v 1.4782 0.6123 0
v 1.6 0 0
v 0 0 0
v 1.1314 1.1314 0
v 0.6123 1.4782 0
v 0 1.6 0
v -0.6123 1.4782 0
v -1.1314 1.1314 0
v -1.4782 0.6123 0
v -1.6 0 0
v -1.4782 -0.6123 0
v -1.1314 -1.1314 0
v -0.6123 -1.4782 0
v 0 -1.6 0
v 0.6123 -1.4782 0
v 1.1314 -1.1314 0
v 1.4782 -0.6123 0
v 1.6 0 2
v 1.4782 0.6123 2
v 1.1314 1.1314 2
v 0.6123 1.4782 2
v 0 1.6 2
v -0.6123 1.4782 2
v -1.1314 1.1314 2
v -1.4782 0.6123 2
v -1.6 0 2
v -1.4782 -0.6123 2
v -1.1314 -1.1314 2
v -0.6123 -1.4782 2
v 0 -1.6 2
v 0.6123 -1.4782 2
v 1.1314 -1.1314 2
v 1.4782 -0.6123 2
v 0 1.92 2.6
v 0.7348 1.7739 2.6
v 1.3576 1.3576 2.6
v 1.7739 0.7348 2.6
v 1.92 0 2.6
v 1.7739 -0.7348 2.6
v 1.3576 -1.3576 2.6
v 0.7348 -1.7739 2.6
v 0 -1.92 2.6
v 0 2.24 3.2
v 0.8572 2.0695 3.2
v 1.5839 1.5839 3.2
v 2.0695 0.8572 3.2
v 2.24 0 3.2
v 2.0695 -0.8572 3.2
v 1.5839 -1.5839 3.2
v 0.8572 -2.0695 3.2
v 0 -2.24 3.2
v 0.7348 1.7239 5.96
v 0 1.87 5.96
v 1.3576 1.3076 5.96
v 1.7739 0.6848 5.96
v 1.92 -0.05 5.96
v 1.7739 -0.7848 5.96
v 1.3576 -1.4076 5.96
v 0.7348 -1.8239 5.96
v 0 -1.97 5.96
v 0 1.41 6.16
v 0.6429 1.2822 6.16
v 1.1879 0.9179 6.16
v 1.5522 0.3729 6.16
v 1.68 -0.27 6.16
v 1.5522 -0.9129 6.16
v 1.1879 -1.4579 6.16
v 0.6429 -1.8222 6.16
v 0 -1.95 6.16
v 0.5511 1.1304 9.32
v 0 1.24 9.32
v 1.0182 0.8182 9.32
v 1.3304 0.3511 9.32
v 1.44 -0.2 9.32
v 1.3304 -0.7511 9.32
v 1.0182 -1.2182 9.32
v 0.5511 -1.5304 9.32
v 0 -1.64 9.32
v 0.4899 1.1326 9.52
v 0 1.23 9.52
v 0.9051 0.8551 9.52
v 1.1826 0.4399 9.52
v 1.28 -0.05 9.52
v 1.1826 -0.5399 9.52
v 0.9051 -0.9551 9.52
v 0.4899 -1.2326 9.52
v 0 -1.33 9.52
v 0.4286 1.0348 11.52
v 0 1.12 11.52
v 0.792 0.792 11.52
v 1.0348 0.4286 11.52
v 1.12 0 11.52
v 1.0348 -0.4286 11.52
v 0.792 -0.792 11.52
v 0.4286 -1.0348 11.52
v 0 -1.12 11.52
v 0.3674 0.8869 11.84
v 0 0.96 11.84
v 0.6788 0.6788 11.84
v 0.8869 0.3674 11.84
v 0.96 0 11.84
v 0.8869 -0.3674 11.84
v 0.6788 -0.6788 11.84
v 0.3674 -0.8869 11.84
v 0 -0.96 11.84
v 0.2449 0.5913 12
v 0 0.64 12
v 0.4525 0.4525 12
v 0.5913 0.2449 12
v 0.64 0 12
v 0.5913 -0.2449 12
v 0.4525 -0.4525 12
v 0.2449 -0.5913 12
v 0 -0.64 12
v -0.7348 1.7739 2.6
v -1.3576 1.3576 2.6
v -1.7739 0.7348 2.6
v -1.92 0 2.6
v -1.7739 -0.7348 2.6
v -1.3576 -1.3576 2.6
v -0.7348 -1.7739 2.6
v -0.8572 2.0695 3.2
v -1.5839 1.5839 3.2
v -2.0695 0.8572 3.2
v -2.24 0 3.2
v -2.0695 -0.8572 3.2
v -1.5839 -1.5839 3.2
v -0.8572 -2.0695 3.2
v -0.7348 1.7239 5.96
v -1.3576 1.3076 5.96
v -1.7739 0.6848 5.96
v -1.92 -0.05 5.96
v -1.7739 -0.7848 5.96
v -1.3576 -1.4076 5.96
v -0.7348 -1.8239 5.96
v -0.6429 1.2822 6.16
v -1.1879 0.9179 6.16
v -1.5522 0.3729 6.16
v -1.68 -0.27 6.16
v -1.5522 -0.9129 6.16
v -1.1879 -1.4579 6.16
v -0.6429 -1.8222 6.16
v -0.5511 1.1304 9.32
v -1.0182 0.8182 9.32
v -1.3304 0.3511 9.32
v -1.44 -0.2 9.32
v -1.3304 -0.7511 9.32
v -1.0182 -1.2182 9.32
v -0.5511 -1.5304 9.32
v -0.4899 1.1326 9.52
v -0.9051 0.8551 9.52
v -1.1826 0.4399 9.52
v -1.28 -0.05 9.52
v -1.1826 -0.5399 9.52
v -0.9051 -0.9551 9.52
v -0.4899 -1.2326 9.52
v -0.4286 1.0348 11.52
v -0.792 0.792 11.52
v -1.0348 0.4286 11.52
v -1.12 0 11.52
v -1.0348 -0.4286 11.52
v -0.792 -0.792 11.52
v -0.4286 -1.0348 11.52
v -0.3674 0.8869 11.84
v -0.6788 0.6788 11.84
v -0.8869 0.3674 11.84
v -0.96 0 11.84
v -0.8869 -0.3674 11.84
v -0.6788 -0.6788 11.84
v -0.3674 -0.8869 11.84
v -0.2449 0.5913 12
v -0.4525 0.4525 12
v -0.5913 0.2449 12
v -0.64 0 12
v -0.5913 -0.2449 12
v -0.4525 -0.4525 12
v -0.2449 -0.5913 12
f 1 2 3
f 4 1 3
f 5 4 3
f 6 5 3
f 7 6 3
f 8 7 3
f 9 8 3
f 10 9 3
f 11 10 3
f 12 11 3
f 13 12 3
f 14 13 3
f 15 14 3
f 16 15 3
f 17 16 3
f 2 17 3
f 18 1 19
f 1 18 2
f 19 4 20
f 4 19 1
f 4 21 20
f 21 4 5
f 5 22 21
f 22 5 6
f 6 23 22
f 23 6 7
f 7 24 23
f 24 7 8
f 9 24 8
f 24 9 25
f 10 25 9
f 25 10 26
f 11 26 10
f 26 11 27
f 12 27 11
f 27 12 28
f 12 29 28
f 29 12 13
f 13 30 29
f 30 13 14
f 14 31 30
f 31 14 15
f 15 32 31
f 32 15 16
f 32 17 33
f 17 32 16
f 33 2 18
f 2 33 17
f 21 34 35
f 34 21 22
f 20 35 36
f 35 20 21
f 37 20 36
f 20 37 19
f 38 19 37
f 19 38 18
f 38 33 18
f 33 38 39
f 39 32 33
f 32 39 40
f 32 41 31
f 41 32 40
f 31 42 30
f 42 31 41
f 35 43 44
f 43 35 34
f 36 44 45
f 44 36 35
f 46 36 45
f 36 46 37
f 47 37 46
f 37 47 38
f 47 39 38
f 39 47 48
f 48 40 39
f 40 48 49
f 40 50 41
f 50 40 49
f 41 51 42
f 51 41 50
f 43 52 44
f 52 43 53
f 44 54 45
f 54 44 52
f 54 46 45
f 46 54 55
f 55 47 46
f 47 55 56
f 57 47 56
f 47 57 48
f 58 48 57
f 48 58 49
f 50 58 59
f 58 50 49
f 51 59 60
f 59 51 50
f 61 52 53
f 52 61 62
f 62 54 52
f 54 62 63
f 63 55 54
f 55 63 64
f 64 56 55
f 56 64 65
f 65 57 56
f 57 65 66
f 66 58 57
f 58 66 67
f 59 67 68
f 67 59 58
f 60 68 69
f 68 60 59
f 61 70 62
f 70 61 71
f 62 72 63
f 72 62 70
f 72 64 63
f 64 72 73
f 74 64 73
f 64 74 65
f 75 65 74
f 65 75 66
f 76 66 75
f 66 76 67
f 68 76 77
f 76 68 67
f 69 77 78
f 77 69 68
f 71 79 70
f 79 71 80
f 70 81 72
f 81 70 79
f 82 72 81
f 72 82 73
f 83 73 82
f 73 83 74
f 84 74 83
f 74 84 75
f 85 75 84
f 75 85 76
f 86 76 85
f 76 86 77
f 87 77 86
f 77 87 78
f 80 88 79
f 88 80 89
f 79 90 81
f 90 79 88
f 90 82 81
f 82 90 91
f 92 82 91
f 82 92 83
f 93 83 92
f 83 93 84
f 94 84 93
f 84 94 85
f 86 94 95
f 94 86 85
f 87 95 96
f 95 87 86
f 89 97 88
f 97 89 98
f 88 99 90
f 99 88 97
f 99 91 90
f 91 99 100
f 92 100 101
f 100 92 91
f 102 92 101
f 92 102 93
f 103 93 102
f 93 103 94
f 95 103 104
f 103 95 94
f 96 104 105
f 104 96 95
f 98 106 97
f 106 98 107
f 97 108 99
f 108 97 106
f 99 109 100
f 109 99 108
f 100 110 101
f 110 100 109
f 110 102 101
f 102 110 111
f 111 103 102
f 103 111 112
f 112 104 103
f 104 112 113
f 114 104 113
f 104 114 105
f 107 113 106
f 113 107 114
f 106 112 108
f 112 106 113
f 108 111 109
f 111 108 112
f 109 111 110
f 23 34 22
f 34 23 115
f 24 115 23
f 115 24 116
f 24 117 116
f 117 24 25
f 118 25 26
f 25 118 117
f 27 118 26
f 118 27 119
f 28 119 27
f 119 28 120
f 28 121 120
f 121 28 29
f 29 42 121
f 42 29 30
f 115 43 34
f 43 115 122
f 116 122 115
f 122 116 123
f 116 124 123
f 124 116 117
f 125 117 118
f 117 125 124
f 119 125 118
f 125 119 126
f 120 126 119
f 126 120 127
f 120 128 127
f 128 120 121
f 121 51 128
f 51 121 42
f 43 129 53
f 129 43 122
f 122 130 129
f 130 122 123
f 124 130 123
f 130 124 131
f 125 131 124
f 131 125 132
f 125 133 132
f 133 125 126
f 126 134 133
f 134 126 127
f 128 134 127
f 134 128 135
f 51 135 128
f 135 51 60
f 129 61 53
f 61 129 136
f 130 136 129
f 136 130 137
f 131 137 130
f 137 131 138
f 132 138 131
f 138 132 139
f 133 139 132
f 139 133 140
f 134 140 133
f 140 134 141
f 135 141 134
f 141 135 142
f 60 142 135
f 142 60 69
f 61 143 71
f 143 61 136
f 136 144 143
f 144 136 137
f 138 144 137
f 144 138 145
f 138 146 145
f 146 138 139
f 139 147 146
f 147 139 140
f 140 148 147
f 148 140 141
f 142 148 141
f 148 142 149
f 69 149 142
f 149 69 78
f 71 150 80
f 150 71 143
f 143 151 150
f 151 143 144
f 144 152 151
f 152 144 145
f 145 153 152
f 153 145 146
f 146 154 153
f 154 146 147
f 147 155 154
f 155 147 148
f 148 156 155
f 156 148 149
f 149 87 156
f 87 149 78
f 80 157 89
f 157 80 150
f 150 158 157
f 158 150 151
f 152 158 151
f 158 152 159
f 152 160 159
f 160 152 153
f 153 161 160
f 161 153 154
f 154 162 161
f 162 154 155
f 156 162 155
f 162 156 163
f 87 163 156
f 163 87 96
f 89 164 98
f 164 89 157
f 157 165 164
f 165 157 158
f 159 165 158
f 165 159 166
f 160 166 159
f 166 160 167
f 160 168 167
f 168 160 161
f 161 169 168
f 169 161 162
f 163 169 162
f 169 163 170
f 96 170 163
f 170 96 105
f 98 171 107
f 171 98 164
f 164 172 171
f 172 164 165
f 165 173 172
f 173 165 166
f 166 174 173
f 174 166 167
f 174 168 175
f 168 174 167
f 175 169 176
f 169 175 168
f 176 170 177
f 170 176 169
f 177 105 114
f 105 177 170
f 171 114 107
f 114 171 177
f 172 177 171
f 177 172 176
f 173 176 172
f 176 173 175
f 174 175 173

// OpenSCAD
// file: ../p/3-8edge.scad
use <../lib.scad>
function ldraw_lib__3_8edge() = [
// 0 Circle 0.375
// 0 Name: 3-8edge.dat
// 0 Author: James Jessiman
// 0 !LDRAW_ORG Primitive UPDATE 2017-01
// 0 !LICENSE Licensed under CC BY 4.0 : see CAreadme.txt
// 
// 0 BFC CERTIFY CCW
  [0,"BFC","CERTIFY"],
  [0,"BFC","CCW"],
// 
// 0 !HISTORY 2007-06-24 [PTadmin] Header formatted for Contributor Agreement
// 0 !HISTORY 2008-07-01 [PTadmin] Official Update 2008-01
// 0 !HISTORY 2017-01-15 [Steffen] BFCed
// 0 !HISTORY 2017-12-30 [PTadmin] Official Update 2017-01
// 
// 
// 2 24 1 0 0 0.9239 0 0.3827
  [2,24,1,0,0,0.9239,0,0.3827],
// 2 24 0.9239 0 0.3827 0.7071 0 0.7071
  [2,24,0.9239,0,0.3827,0.7071,0,0.7071],
// 2 24 0.7071 0 0.7071 0.3827 0 0.9239
  [2,24,0.7071,0,0.7071,0.3827,0,0.9239],
// 2 24 0.3827 0 0.9239 0 0 1
  [2,24,0.3827,0,0.9239,0,0,1],
// 2 24 0 0 1 -0.3827 0 0.9239
  [2,24,0,0,1,-0.3827,0,0.9239],
// 2 24 -0.3827 0 0.9239 -0.7071 0 0.7071
  [2,24,-0.3827,0,0.9239,-0.7071,0,0.7071],
];
module ldraw_lib__3_8edge(step=0, col=false, unit=2/5, alt=false, line=0.2, solid=!$preview)
    makepoly(ldraw_lib__3_8edge(), step=step, col=col, unit=unit, alt=alt, line=line, solid=solid);
ldraw_lib__3_8edge(line=0.2);
// file: ../p/2-4edge.scad
use <../lib.scad>
function ldraw_lib__2_4edge() = [
// 0 Circle 0.5
// 0 Name: 2-4edge.dat
// 0 Author: James Jessiman
// 0 !LDRAW_ORG Primitive UPDATE 2017-01
// 0 !LICENSE Licensed under CC BY 4.0 : see CAreadme.txt
// 
// 0 BFC CERTIFY CCW
  [0,"BFC","CERTIFY"],
  [0,"BFC","CCW"],
// 
// 0 !HISTORY 2007-06-24 [PTadmin] Header formatted for Contributor Agreement
// 0 !HISTORY 2008-07-01 [PTadmin] Official Update 2008-01
// 0 !HISTORY 2017-01-15 [Steffen] BFCed
// 0 !HISTORY 2017-12-30 [PTadmin] Official Update 2017-01
// 
// 
// 2 24 1 0 0 0.9239 0 0.3827
  [2,24,1,0,0,0.9239,0,0.3827],
// 2 24 0.9239 0 0.3827 0.7071 0 0.7071
  [2,24,0.9239,0,0.3827,0.7071,0,0.7071],
// 2 24 0.7071 0 0.7071 0.3827 0 0.9239
  [2,24,0.7071,0,0.7071,0.3827,0,0.9239],
// 2 24 0.3827 0 0.9239 0 0 1
  [2,24,0.3827,0,0.9239,0,0,1],
// 2 24 0 0 1 -0.3827 0 0.9239
  [2,24,0,0,1,-0.3827,0,0.9239],
// 2 24 -0.3827 0 0.9239 -0.7071 0 0.7071
  [2,24,-0.3827,0,0.9239,-0.7071,0,0.7071],
// 2 24 -0.7071 0 0.7071 -0.9239 0 0.3827
  [2,24,-0.7071,0,0.7071,-0.9239,0,0.3827],
// 2 24 -0.9239 0 0.3827 -1 0 0
  [2,24,-0.9239,0,0.3827,-1,0,0],
];
module ldraw_lib__2_4edge(step=0, col=false, unit=2/5, alt=false, line=0.2, solid=!$preview)
    makepoly(ldraw_lib__2_4edge(), step=step, col=col, unit=unit, alt=alt, line=line, solid=solid);
ldraw_lib__2_4edge(line=0.2);
// file: ../p/2-4con8.scad
use <../lib.scad>
function ldraw_lib__2_4con8() = [
// 0 Cone  8 x 0.5
// 0 Name: 2-4con8.dat
// 0 Author: Donald Sutter [technog]
// 0 !LDRAW_ORG Primitive UPDATE 2012-02
// 0 !LICENSE Licensed under CC BY 4.0 : see CAreadme.txt
// 
// 0 BFC CERTIFY CCW
  [0,"BFC","CERTIFY"],
  [0,"BFC","CCW"],
// 
// 0 !HISTORY 2012-08-09 [PTadmin] Official Update 2012-02
// 
// 
// 4 16 8 1 0 7.3912 1 3.0616 8.3151 0 3.4443 9 0 0
  [4,16,8,1,0,7.3912,1,3.0616,8.3151,0,3.4443,9,0,0],
// 4 16 7.3912 1 3.0616 5.6568 1 5.6568 6.3639 0 6.3639 8.3151 0 3.4443
  [4,16,7.3912,1,3.0616,5.6568,1,5.6568,6.3639,0,6.3639,8.3151,0,3.4443],
// 4 16 5.6568 1 5.6568 3.0616 1 7.3912 3.4443 0 8.3151 6.3639 0 6.3639
  [4,16,5.6568,1,5.6568,3.0616,1,7.3912,3.4443,0,8.3151,6.3639,0,6.3639],
// 4 16 3.0616 1 7.3912 0 1 8 0 0 9 3.4443 0 8.3151
  [4,16,3.0616,1,7.3912,0,1,8,0,0,9,3.4443,0,8.3151],
// 4 16 0 1 8 -3.0616 1 7.3912 -3.4443 0 8.3151 0 0 9
  [4,16,0,1,8,-3.0616,1,7.3912,-3.4443,0,8.3151,0,0,9],
// 4 16 -3.0616 1 7.3912 -5.6568 1 5.6568 -6.3639 0 6.3639 -3.4443 0 8.3151
  [4,16,-3.0616,1,7.3912,-5.6568,1,5.6568,-6.3639,0,6.3639,-3.4443,0,8.3151],
// 4 16 -5.6568 1 5.6568 -7.3912 1 3.0616 -8.3151 0 3.4443 -6.3639 0 6.3639
  [4,16,-5.6568,1,5.6568,-7.3912,1,3.0616,-8.3151,0,3.4443,-6.3639,0,6.3639],
// 4 16 -7.3912 1 3.0616 -8 1 0 -9 0 0 -8.3151 0 3.4443
  [4,16,-7.3912,1,3.0616,-8,1,0,-9,0,0,-8.3151,0,3.4443],
// 5 24 8 1 0 9 0 0 8 1 -3.3137 7.391 1 3.0615
  [5,24,8,1,0,9,0,0,8,1,-3.3137,7.391,1,3.0615],
// 5 24 7.3912 1 3.0616 8.3151 0 3.4443 8 1 0 5.6569 1 5.6569
  [5,24,7.3912,1,3.0616,8.3151,0,3.4443,8,1,0,5.6569,1,5.6569],
// 5 24 5.6568 1 5.6568 6.3639 0 6.3639 7.391 1 3.0615 3.0615 1 7.391
  [5,24,5.6568,1,5.6568,6.3639,0,6.3639,7.391,1,3.0615,3.0615,1,7.391],
// 5 24 3.0616 1 7.3912 3.4443 0 8.3151 5.6569 1 5.6569 0 1 8
  [5,24,3.0616,1,7.3912,3.4443,0,8.3151,5.6569,1,5.6569,0,1,8],
// 5 24 0 1 8 0 0 9 3.0615 1 7.391 -3.0615 1 7.391
  [5,24,0,1,8,0,0,9,3.0615,1,7.391,-3.0615,1,7.391],
// 5 24 -3.0616 1 7.3912 -3.4443 0 8.3151 0 1 8 -5.6569 1 5.6569
  [5,24,-3.0616,1,7.3912,-3.4443,0,8.3151,0,1,8,-5.6569,1,5.6569],
// 5 24 -5.6568 1 5.6568 -6.3639 0 6.3639 -3.0615 1 7.391 -7.391 1 3.0615
  [5,24,-5.6568,1,5.6568,-6.3639,0,6.3639,-3.0615,1,7.391,-7.391,1,3.0615],
// 5 24 -7.3912 1 3.0616 -8.3151 0 3.4443 -5.6569 1 5.6569 -8 1 0
  [5,24,-7.3912,1,3.0616,-8.3151,0,3.4443,-5.6569,1,5.6569,-8,1,0],
// 5 24 -8 1 0 -9 0 0 -7.391 1 3.0615 -8 1 -3.3137
  [5,24,-8,1,0,-9,0,0,-7.391,1,3.0615,-8,1,-3.3137],
];
module ldraw_lib__2_4con8(step=0, col=false, unit=2/5, alt=false, line=0.2, solid=!$preview)
    makepoly(ldraw_lib__2_4con8(), step=step, col=col, unit=unit, alt=alt, line=line, solid=solid);
ldraw_lib__2_4con8(line=0.2);
// file: ../p/2-4con7.scad
use <../lib.scad>
function ldraw_lib__2_4con7() = [
// 0 Cone  7 x 0.5
// 0 Name: 2-4con7.dat
// 0 Author: Willy Tschager [Holly-Wood]
// 0 !LDRAW_ORG Primitive UPDATE 2024-02
// 0 !LICENSE Licensed under CC BY 4.0 : see CAreadme.txt
// 
// 0 BFC CERTIFY CCW
  [0,"BFC","CERTIFY"],
  [0,"BFC","CCW"],
// 
// 0 !HISTORY 2014-06-21 [PTadmin] Official Update 2014-01
// 0 !HISTORY 2024-02-09 [Holly-Wood] Complete regeneration, original by guyvivan
// 0 !HISTORY 2024-03-24 [OrionP] Official Update 2024-02
// 
// 4 16 7 1 0 6.4673 1 2.6789 7.3912 0 3.0616 8 0 0
  [4,16,7,1,0,6.4673,1,2.6789,7.3912,0,3.0616,8,0,0],
// 4 16 6.4673 1 2.6789 4.9497 1 4.9497 5.6568 0 5.6568 7.3912 0 3.0616
  [4,16,6.4673,1,2.6789,4.9497,1,4.9497,5.6568,0,5.6568,7.3912,0,3.0616],
// 4 16 4.9497 1 4.9497 2.6789 1 6.4673 3.0616 0 7.3912 5.6568 0 5.6568
  [4,16,4.9497,1,4.9497,2.6789,1,6.4673,3.0616,0,7.3912,5.6568,0,5.6568],
// 4 16 2.6789 1 6.4673 0 1 7 0 0 8 3.0616 0 7.3912
  [4,16,2.6789,1,6.4673,0,1,7,0,0,8,3.0616,0,7.3912],
// 4 16 0 1 7 -2.6789 1 6.4673 -3.0616 0 7.3912 0 0 8
  [4,16,0,1,7,-2.6789,1,6.4673,-3.0616,0,7.3912,0,0,8],
// 4 16 -2.6789 1 6.4673 -4.9497 1 4.9497 -5.6568 0 5.6568 -3.0616 0 7.3912
  [4,16,-2.6789,1,6.4673,-4.9497,1,4.9497,-5.6568,0,5.6568,-3.0616,0,7.3912],
// 4 16 -4.9497 1 4.9497 -6.4673 1 2.6789 -7.3912 0 3.0616 -5.6568 0 5.6568
  [4,16,-4.9497,1,4.9497,-6.4673,1,2.6789,-7.3912,0,3.0616,-5.6568,0,5.6568],
// 4 16 -6.4673 1 2.6789 -7 1 0 -8 0 0 -7.3912 0 3.0616
  [4,16,-6.4673,1,2.6789,-7,1,0,-8,0,0,-7.3912,0,3.0616],
// 0 // conditional lines
// 5 24 7 1 0 8 0 0 7 1 -2.8994 6.4673 1 2.6789
  [5,24,7,1,0,8,0,0,7,1,-2.8994,6.4673,1,2.6789],
// 5 24 6.4673 1 2.6789 7.3912 0 3.0616 7 1 0 4.9497 1 4.9497
  [5,24,6.4673,1,2.6789,7.3912,0,3.0616,7,1,0,4.9497,1,4.9497],
// 5 24 4.9497 1 4.9497 5.6568 0 5.6568 6.4673 1 2.6789 2.6789 1 6.4673
  [5,24,4.9497,1,4.9497,5.6568,0,5.6568,6.4673,1,2.6789,2.6789,1,6.4673],
// 5 24 2.6789 1 6.4673 3.0616 0 7.3912 4.9497 1 4.9497 0 1 7
  [5,24,2.6789,1,6.4673,3.0616,0,7.3912,4.9497,1,4.9497,0,1,7],
// 5 24 0 1 7 0 0 8 2.6789 1 6.4673 -2.6789 1 6.4673
  [5,24,0,1,7,0,0,8,2.6789,1,6.4673,-2.6789,1,6.4673],
// 5 24 -2.6789 1 6.4673 -3.0616 0 7.3912 0 1 7 -4.9497 1 4.9497
  [5,24,-2.6789,1,6.4673,-3.0616,0,7.3912,0,1,7,-4.9497,1,4.9497],
// 5 24 -4.9497 1 4.9497 -5.6568 0 5.6568 -2.6789 1 6.4673 -6.4673 1 2.6789
  [5,24,-4.9497,1,4.9497,-5.6568,0,5.6568,-2.6789,1,6.4673,-6.4673,1,2.6789],
// 5 24 -6.4673 1 2.6789 -7.3912 0 3.0616 -4.9497 1 4.9497 -7 1 0
  [5,24,-6.4673,1,2.6789,-7.3912,0,3.0616,-4.9497,1,4.9497,-7,1,0],
// 5 24 -7 1 0 -8 0 0 -6.4673 1 2.6789 -7 1 -2.8994
  [5,24,-7,1,0,-8,0,0,-6.4673,1,2.6789,-7,1,-2.8994],
// 0 // Build by LDPartEditor (PrimGen 2.X)
];
module ldraw_lib__2_4con7(step=0, col=false, unit=2/5, alt=false, line=0.2, solid=!$preview)
    makepoly(ldraw_lib__2_4con7(), step=step, col=col, unit=unit, alt=alt, line=line, solid=solid);
ldraw_lib__2_4con7(line=0.2);
// file: ../p/2-4con6.scad
use <../lib.scad>
function ldraw_lib__2_4con6() = [
// 0 Cone  6 x 0.5
// 0 Name: 2-4con6.dat
// 0 Author: Max Martin Richter [MMR1988]
// 0 !LDRAW_ORG Primitive UPDATE 2020-01
// 0 !LICENSE Licensed under CC BY 4.0 : see CAreadme.txt
// 
// 0 BFC CERTIFY CCW
  [0,"BFC","CERTIFY"],
  [0,"BFC","CCW"],
// 
// 0 !HISTORY 2020-06-28 [PTadmin] Official Update 2020-01
// 
// 
// 4 16 6 1 0 5.5434 1 2.2962 6.4673 0 2.6789 7 0 0
  [4,16,6,1,0,5.5434,1,2.2962,6.4673,0,2.6789,7,0,0],
// 4 16 5.5434 1 2.2962 4.2426 1 4.2426 4.9497 0 4.9497 6.4673 0 2.6789
  [4,16,5.5434,1,2.2962,4.2426,1,4.2426,4.9497,0,4.9497,6.4673,0,2.6789],
// 4 16 4.2426 1 4.2426 2.2962 1 5.5434 2.6789 0 6.4673 4.9497 0 4.9497
  [4,16,4.2426,1,4.2426,2.2962,1,5.5434,2.6789,0,6.4673,4.9497,0,4.9497],
// 4 16 2.2962 1 5.5434 0 1 6 0 0 7 2.6789 0 6.4673
  [4,16,2.2962,1,5.5434,0,1,6,0,0,7,2.6789,0,6.4673],
// 4 16 0 1 6 -2.2962 1 5.5434 -2.6789 0 6.4673 0 0 7
  [4,16,0,1,6,-2.2962,1,5.5434,-2.6789,0,6.4673,0,0,7],
// 4 16 -2.2962 1 5.5434 -4.2426 1 4.2426 -4.9497 0 4.9497 -2.6789 0 6.4673
  [4,16,-2.2962,1,5.5434,-4.2426,1,4.2426,-4.9497,0,4.9497,-2.6789,0,6.4673],
// 4 16 -4.2426 1 4.2426 -5.5434 1 2.2962 -6.4673 0 2.6789 -4.9497 0 4.9497
  [4,16,-4.2426,1,4.2426,-5.5434,1,2.2962,-6.4673,0,2.6789,-4.9497,0,4.9497],
// 4 16 -5.5434 1 2.2962 -6 1 0 -7 0 0 -6.4673 0 2.6789
  [4,16,-5.5434,1,2.2962,-6,1,0,-7,0,0,-6.4673,0,2.6789],
// 0 // conditional lines
// 5 24 6 1 0 7 0 0 6 1 -2.4852 5.5434 1 2.2962
  [5,24,6,1,0,7,0,0,6,1,-2.4852,5.5434,1,2.2962],
// 5 24 5.5434 1 2.2962 6.4673 0 2.6789 6 1 0 4.2426 1 4.2426
  [5,24,5.5434,1,2.2962,6.4673,0,2.6789,6,1,0,4.2426,1,4.2426],
// 5 24 4.2426 1 4.2426 4.9497 0 4.9497 5.5434 1 2.2962 2.2962 1 5.5434
  [5,24,4.2426,1,4.2426,4.9497,0,4.9497,5.5434,1,2.2962,2.2962,1,5.5434],
// 5 24 2.2962 1 5.5434 2.6789 0 6.4673 4.2426 1 4.2426 0 1 6
  [5,24,2.2962,1,5.5434,2.6789,0,6.4673,4.2426,1,4.2426,0,1,6],
// 5 24 0 1 6 0 0 7 2.2962 1 5.5434 -2.2962 1 5.5434
  [5,24,0,1,6,0,0,7,2.2962,1,5.5434,-2.2962,1,5.5434],
// 5 24 -2.2962 1 5.5434 -2.6789 0 6.4673 0 1 6 -4.2426 1 4.2426
  [5,24,-2.2962,1,5.5434,-2.6789,0,6.4673,0,1,6,-4.2426,1,4.2426],
// 5 24 -4.2426 1 4.2426 -4.9497 0 4.9497 -2.2962 1 5.5434 -5.5434 1 2.2962
  [5,24,-4.2426,1,4.2426,-4.9497,0,4.9497,-2.2962,1,5.5434,-5.5434,1,2.2962],
// 5 24 -5.5434 1 2.2962 -6.4673 0 2.6789 -4.2426 1 4.2426 -6 1 0
  [5,24,-5.5434,1,2.2962,-6.4673,0,2.6789,-4.2426,1,4.2426,-6,1,0],
// 5 24 -6 1 0 -7 0 0 -5.5434 1 2.2962 -6 1 -2.4852
  [5,24,-6,1,0,-7,0,0,-5.5434,1,2.2962,-6,1,-2.4852],
// 0 // Build by Primitive Generator 2
];
module ldraw_lib__2_4con6(step=0, col=false, unit=2/5, alt=false, line=0.2, solid=!$preview)
    makepoly(ldraw_lib__2_4con6(), step=step, col=col, unit=unit, alt=alt, line=line, solid=solid);
ldraw_lib__2_4con6(line=0.2);
// file: ../p/2-4con5.scad
use <../lib.scad>
function ldraw_lib__2_4con5() = [
// 0 Cone  5 x 0.5
// 0 Name: 2-4con5.dat
// 0 Author: Santeri Piippo [arezey]
// 0 !LDRAW_ORG Primitive UPDATE 2020-03
// 0 !LICENSE Licensed under CC BY 4.0 : see CAreadme.txt
// 
// 0 BFC CERTIFY CCW
  [0,"BFC","CERTIFY"],
  [0,"BFC","CCW"],
// 
// 0 !HISTORY 2020-12-29 [PTadmin] Official Update 2020-03
// 
// 
// 4 16 5 1 0 4.6195 1 1.9135 5.5434 0 2.2962 6 0 0
  [4,16,5,1,0,4.6195,1,1.9135,5.5434,0,2.2962,6,0,0],
// 4 16 4.6195 1 1.9135 3.5355 1 3.5355 4.2426 0 4.2426 5.5434 0 2.2962
  [4,16,4.6195,1,1.9135,3.5355,1,3.5355,4.2426,0,4.2426,5.5434,0,2.2962],
// 4 16 3.5355 1 3.5355 1.9135 1 4.6195 2.2962 0 5.5434 4.2426 0 4.2426
  [4,16,3.5355,1,3.5355,1.9135,1,4.6195,2.2962,0,5.5434,4.2426,0,4.2426],
// 4 16 1.9135 1 4.6195 0 1 5 0 0 6 2.2962 0 5.5434
  [4,16,1.9135,1,4.6195,0,1,5,0,0,6,2.2962,0,5.5434],
// 4 16 0 1 5 -1.9135 1 4.6195 -2.2962 0 5.5434 0 0 6
  [4,16,0,1,5,-1.9135,1,4.6195,-2.2962,0,5.5434,0,0,6],
// 4 16 -1.9135 1 4.6195 -3.5355 1 3.5355 -4.2426 0 4.2426 -2.2962 0 5.5434
  [4,16,-1.9135,1,4.6195,-3.5355,1,3.5355,-4.2426,0,4.2426,-2.2962,0,5.5434],
// 4 16 -3.5355 1 3.5355 -4.6195 1 1.9135 -5.5434 0 2.2962 -4.2426 0 4.2426
  [4,16,-3.5355,1,3.5355,-4.6195,1,1.9135,-5.5434,0,2.2962,-4.2426,0,4.2426],
// 4 16 -4.6195 1 1.9135 -5 1 0 -6 0 0 -5.5434 0 2.2962
  [4,16,-4.6195,1,1.9135,-5,1,0,-6,0,0,-5.5434,0,2.2962],
// 0 // conditional lines
// 5 24 5 1 0 6 0 0 5 1 -2.071 4.6195 1 1.9135
  [5,24,5,1,0,6,0,0,5,1,-2.071,4.6195,1,1.9135],
// 5 24 4.6195 1 1.9135 5.5434 0 2.2962 5 1 0 3.5355 1 3.5355
  [5,24,4.6195,1,1.9135,5.5434,0,2.2962,5,1,0,3.5355,1,3.5355],
// 5 24 3.5355 1 3.5355 4.2426 0 4.2426 4.6195 1 1.9135 1.9135 1 4.6195
  [5,24,3.5355,1,3.5355,4.2426,0,4.2426,4.6195,1,1.9135,1.9135,1,4.6195],
// 5 24 1.9135 1 4.6195 2.2962 0 5.5434 3.5355 1 3.5355 0 1 5
  [5,24,1.9135,1,4.6195,2.2962,0,5.5434,3.5355,1,3.5355,0,1,5],
// 5 24 0 1 5 0 0 6 1.9135 1 4.6195 -1.9135 1 4.6195
  [5,24,0,1,5,0,0,6,1.9135,1,4.6195,-1.9135,1,4.6195],
// 5 24 -1.9135 1 4.6195 -2.2962 0 5.5434 0 1 5 -3.5355 1 3.5355
  [5,24,-1.9135,1,4.6195,-2.2962,0,5.5434,0,1,5,-3.5355,1,3.5355],
// 5 24 -3.5355 1 3.5355 -4.2426 0 4.2426 -1.9135 1 4.6195 -4.6195 1 1.9135
  [5,24,-3.5355,1,3.5355,-4.2426,0,4.2426,-1.9135,1,4.6195,-4.6195,1,1.9135],
// 5 24 -4.6195 1 1.9135 -5.5434 0 2.2962 -3.5355 1 3.5355 -5 1 0
  [5,24,-4.6195,1,1.9135,-5.5434,0,2.2962,-3.5355,1,3.5355,-5,1,0],
// 5 24 -5 1 0 -6 0 0 -4.6195 1 1.9135 -5 1 -2.071
  [5,24,-5,1,0,-6,0,0,-4.6195,1,1.9135,-5,1,-2.071],
// 0 // Build by Primitive Generator 2
];
module ldraw_lib__2_4con5(step=0, col=false, unit=2/5, alt=false, line=0.2, solid=!$preview)
    makepoly(ldraw_lib__2_4con5(), step=step, col=col, unit=unit, alt=alt, line=line, solid=solid);
ldraw_lib__2_4con5(line=0.2);
// file: ../p/2-4con2.scad
use <../lib.scad>
function ldraw_lib__2_4con2() = [
// 0 Cone  2 x 0.5
// 0 Name: 2-4con2.dat
// 0 Author: Willy Tschager [Holly-Wood]
// 0 !LDRAW_ORG Primitive UPDATE 2024-01
// 0 !LICENSE Licensed under CC BY 4.0 : see CAreadme.txt
// 
// 0 BFC CERTIFY CCW
  [0,"BFC","CERTIFY"],
  [0,"BFC","CCW"],
// 
// 0 !HISTORY 2009-05-02 [PTadmin] Official Update 2009-01
// 0 !HISTORY 2024-01-19 [Holly-Wood] Complete regeneration, original by guyvivan
// 0 !HISTORY 2024-01-29 [OrionP] Official Update 2024-01
// 
// 4 16 2 1 0 1.8478 1 0.7654 2.7717 0 1.1481 3 0 0
  [4,16,2,1,0,1.8478,1,0.7654,2.7717,0,1.1481,3,0,0],
// 4 16 1.8478 1 0.7654 1.4142 1 1.4142 2.1213 0 2.1213 2.7717 0 1.1481
  [4,16,1.8478,1,0.7654,1.4142,1,1.4142,2.1213,0,2.1213,2.7717,0,1.1481],
// 4 16 1.4142 1 1.4142 0.7654 1 1.8478 1.1481 0 2.7717 2.1213 0 2.1213
  [4,16,1.4142,1,1.4142,0.7654,1,1.8478,1.1481,0,2.7717,2.1213,0,2.1213],
// 4 16 0.7654 1 1.8478 0 1 2 0 0 3 1.1481 0 2.7717
  [4,16,0.7654,1,1.8478,0,1,2,0,0,3,1.1481,0,2.7717],
// 4 16 0 1 2 -0.7654 1 1.8478 -1.1481 0 2.7717 0 0 3
  [4,16,0,1,2,-0.7654,1,1.8478,-1.1481,0,2.7717,0,0,3],
// 4 16 -0.7654 1 1.8478 -1.4142 1 1.4142 -2.1213 0 2.1213 -1.1481 0 2.7717
  [4,16,-0.7654,1,1.8478,-1.4142,1,1.4142,-2.1213,0,2.1213,-1.1481,0,2.7717],
// 4 16 -1.4142 1 1.4142 -1.8478 1 0.7654 -2.7717 0 1.1481 -2.1213 0 2.1213
  [4,16,-1.4142,1,1.4142,-1.8478,1,0.7654,-2.7717,0,1.1481,-2.1213,0,2.1213],
// 4 16 -1.8478 1 0.7654 -2 1 0 -3 0 0 -2.7717 0 1.1481
  [4,16,-1.8478,1,0.7654,-2,1,0,-3,0,0,-2.7717,0,1.1481],
// 0 // conditional lines
// 5 24 2 1 0 3 0 0 2 1 -0.8284 1.8478 1 0.7654
  [5,24,2,1,0,3,0,0,2,1,-0.8284,1.8478,1,0.7654],
// 5 24 1.8478 1 0.7654 2.7717 0 1.1481 2 1 0 1.4142 1 1.4142
  [5,24,1.8478,1,0.7654,2.7717,0,1.1481,2,1,0,1.4142,1,1.4142],
// 5 24 1.4142 1 1.4142 2.1213 0 2.1213 1.8478 1 0.7654 0.7654 1 1.8478
  [5,24,1.4142,1,1.4142,2.1213,0,2.1213,1.8478,1,0.7654,0.7654,1,1.8478],
// 5 24 0.7654 1 1.8478 1.1481 0 2.7717 1.4142 1 1.4142 0 1 2
  [5,24,0.7654,1,1.8478,1.1481,0,2.7717,1.4142,1,1.4142,0,1,2],
// 5 24 0 1 2 0 0 3 0.7654 1 1.8478 -0.7654 1 1.8478
  [5,24,0,1,2,0,0,3,0.7654,1,1.8478,-0.7654,1,1.8478],
// 5 24 -0.7654 1 1.8478 -1.1481 0 2.7717 0 1 2 -1.4142 1 1.4142
  [5,24,-0.7654,1,1.8478,-1.1481,0,2.7717,0,1,2,-1.4142,1,1.4142],
// 5 24 -1.4142 1 1.4142 -2.1213 0 2.1213 -0.7654 1 1.8478 -1.8478 1 0.7654
  [5,24,-1.4142,1,1.4142,-2.1213,0,2.1213,-0.7654,1,1.8478,-1.8478,1,0.7654],
// 5 24 -1.8478 1 0.7654 -2.7717 0 1.1481 -1.4142 1 1.4142 -2 1 0
  [5,24,-1.8478,1,0.7654,-2.7717,0,1.1481,-1.4142,1,1.4142,-2,1,0],
// 5 24 -2 1 0 -3 0 0 -1.8478 1 0.7654 -2 1 -0.8284
  [5,24,-2,1,0,-3,0,0,-1.8478,1,0.7654,-2,1,-0.8284],
// 0 // Build by LDPartEditor (PrimGen 2.X)
];
module ldraw_lib__2_4con2(step=0, col=false, unit=2/5, alt=false, line=0.2, solid=!$preview)
    makepoly(ldraw_lib__2_4con2(), step=step, col=col, unit=unit, alt=alt, line=line, solid=solid);
ldraw_lib__2_4con2(line=0.2);
// file: ../p/2-4chrd.scad
use <../lib.scad>
function ldraw_lib__2_4chrd() = [
// 0 Chord 0.5
// 0 Name: 2-4chrd.dat
// 0 Author: Philippe Hurbain [Philo]
// 0 !LDRAW_ORG Primitive UPDATE 2014-01
// 0 !LICENSE Licensed under CC BY 4.0 : see CAreadme.txt
// 
// 0 BFC CERTIFY CCW
  [0,"BFC","CERTIFY"],
  [0,"BFC","CCW"],
// 
// 0 !HISTORY 2014-06-21 [PTadmin] Official Update 2014-01
// 
// 
// 4 16 0.9239 0 0.3827 -0.9239 0 0.3827 -1 0 0 1 0 0
  [4,16,0.9239,0,0.3827,-0.9239,0,0.3827,-1,0,0,1,0,0],
// 4 16 0.7071 0 0.7071 -0.7071 0 0.7071 -0.9239 0 0.3827 0.9239 0 0.3827
  [4,16,0.7071,0,0.7071,-0.7071,0,0.7071,-0.9239,0,0.3827,0.9239,0,0.3827],
// 4 16 0.3827 0 0.9239 -0.3827 0 0.9239 -0.7071 0 0.7071 0.7071 0 0.7071
  [4,16,0.3827,0,0.9239,-0.3827,0,0.9239,-0.7071,0,0.7071,0.7071,0,0.7071],
// 3 16 0 0 1 -0.3827 0 0.9239 0.3827 0 0.9239
  [3,16,0,0,1,-0.3827,0,0.9239,0.3827,0,0.9239],
];
module ldraw_lib__2_4chrd(step=0, col=false, unit=2/5, alt=false, line=0.2, solid=!$preview)
    makepoly(ldraw_lib__2_4chrd(), step=step, col=col, unit=unit, alt=alt, line=line, solid=solid);
ldraw_lib__2_4chrd(line=0.2);
// file: ../p/4-4edge.scad
use <../lib.scad>
function ldraw_lib__4_4edge() = [
// 0 Circle 1.0
// 0 Name: 4-4edge.dat
// 0 Author: James Jessiman
// 0 !LDRAW_ORG Primitive UPDATE 2017-01
// 0 !LICENSE Licensed under CC BY 4.0 : see CAreadme.txt
// 
// 0 BFC CERTIFY CCW
  [0,"BFC","CERTIFY"],
  [0,"BFC","CCW"],
// 
// 0 !HISTORY 1998-12-15 [PTadmin] Official Update 1998-10
// 0 !HISTORY 2005-12-28 [PTadmin] Official Update 2005-01
// 0 !HISTORY 2007-06-24 [PTadmin] Header formatted for Contributor Agreement
// 0 !HISTORY 2008-07-01 [PTadmin] Official Update 2008-01
// 0 !HISTORY 2017-01-15 [Steffen] BFCed
// 0 !HISTORY 2017-12-30 [PTadmin] Official Update 2017-01
// 
// 
// 2 24 1 0 0 0.9239 0 0.3827
  [2,24,1,0,0,0.9239,0,0.3827],
// 2 24 0.9239 0 0.3827 0.7071 0 0.7071
  [2,24,0.9239,0,0.3827,0.7071,0,0.7071],
// 2 24 0.7071 0 0.7071 0.3827 0 0.9239
  [2,24,0.7071,0,0.7071,0.3827,0,0.9239],
// 2 24 0.3827 0 0.9239 0 0 1
  [2,24,0.3827,0,0.9239,0,0,1],
// 2 24 0 0 1 -0.3827 0 0.9239
  [2,24,0,0,1,-0.3827,0,0.9239],
// 2 24 -0.3827 0 0.9239 -0.7071 0 0.7071
  [2,24,-0.3827,0,0.9239,-0.7071,0,0.7071],
// 2 24 -0.7071 0 0.7071 -0.9239 0 0.3827
  [2,24,-0.7071,0,0.7071,-0.9239,0,0.3827],
// 2 24 -0.9239 0 0.3827 -1 0 -0
  [2,24,-0.9239,0,0.3827,-1,0,-0],
// 2 24 -1 0 -0 -0.9239 0 -0.3827
  [2,24,-1,0,-0,-0.9239,0,-0.3827],
// 2 24 -0.9239 0 -0.3827 -0.7071 0 -0.7071
  [2,24,-0.9239,0,-0.3827,-0.7071,0,-0.7071],
// 2 24 -0.7071 0 -0.7071 -0.3827 0 -0.9239
  [2,24,-0.7071,0,-0.7071,-0.3827,0,-0.9239],
// 2 24 -0.3827 0 -0.9239 0 0 -1
  [2,24,-0.3827,0,-0.9239,0,0,-1],
// 2 24 0 0 -1 0.3827 0 -0.9239
  [2,24,0,0,-1,0.3827,0,-0.9239],
// 2 24 0.3827 0 -0.9239 0.7071 0 -0.7071
  [2,24,0.3827,0,-0.9239,0.7071,0,-0.7071],
// 2 24 0.7071 0 -0.7071 0.9239 0 -0.3827
  [2,24,0.7071,0,-0.7071,0.9239,0,-0.3827],
// 2 24 0.9239 0 -0.3827 1 0 0
  [2,24,0.9239,0,-0.3827,1,0,0],
];
module ldraw_lib__4_4edge(step=0, col=false, unit=2/5, alt=false, line=0.2, solid=!$preview)
    makepoly(ldraw_lib__4_4edge(), step=step, col=col, unit=unit, alt=alt, line=line, solid=solid);
ldraw_lib__4_4edge(line=0.2);
// file: ../p/4-4disc.scad
use <../lib.scad>
function ldraw_lib__4_4disc() = [
// 0 Disc 1.0
// 0 Name: 4-4disc.dat
// 0 Author: James Jessiman
// 0 !LDRAW_ORG Primitive UPDATE 2002-02
// 0 !LICENSE Licensed under CC BY 4.0 : see CAreadme.txt
// 
// 0 BFC CERTIFY CCW
  [0,"BFC","CERTIFY"],
  [0,"BFC","CCW"],
// 
// 0 !HISTORY 1998-12-15 [PTadmin] Official Update 1998-10
// 0 !HISTORY 2002-03-23 [sbliss] Added BFC statement
// 0 !HISTORY 2002-04-25 [PTadmin] Official Update 2002-02
// 0 !HISTORY 2007-06-24 [PTadmin] Header formatted for Contributor Agreement
// 0 !HISTORY 2008-07-01 [PTadmin] Official Update 2008-01
// 
// 
// 3 16 0 0 0 1 0 0 0.9239 0 0.3827
  [3,16,0,0,0,1,0,0,0.9239,0,0.3827],
// 3 16 0 0 0 0.9239 0 0.3827 0.7071 0 0.7071
  [3,16,0,0,0,0.9239,0,0.3827,0.7071,0,0.7071],
// 3 16 0 0 0 0.7071 0 0.7071 0.3827 0 0.9239
  [3,16,0,0,0,0.7071,0,0.7071,0.3827,0,0.9239],
// 3 16 0 0 0 0.3827 0 0.9239 0 0 1
  [3,16,0,0,0,0.3827,0,0.9239,0,0,1],
// 3 16 0 0 0 0 0 1 -0.3827 0 0.9239
  [3,16,0,0,0,0,0,1,-0.3827,0,0.9239],
// 3 16 0 0 0 -0.3827 0 0.9239 -0.7071 0 0.7071
  [3,16,0,0,0,-0.3827,0,0.9239,-0.7071,0,0.7071],
// 3 16 0 0 0 -0.7071 0 0.7071 -0.9239 0 0.3827
  [3,16,0,0,0,-0.7071,0,0.7071,-0.9239,0,0.3827],
// 3 16 0 0 0 -0.9239 0 0.3827 -1 0 -0
  [3,16,0,0,0,-0.9239,0,0.3827,-1,0,-0],
// 3 16 0 0 0 -1 0 -0 -0.9239 0 -0.3827
  [3,16,0,0,0,-1,0,-0,-0.9239,0,-0.3827],
// 3 16 0 0 0 -0.9239 0 -0.3827 -0.7071 0 -0.7071
  [3,16,0,0,0,-0.9239,0,-0.3827,-0.7071,0,-0.7071],
// 3 16 0 0 0 -0.7071 0 -0.7071 -0.3827 0 -0.9239
  [3,16,0,0,0,-0.7071,0,-0.7071,-0.3827,0,-0.9239],
// 3 16 0 0 0 -0.3827 0 -0.9239 0 0 -1
  [3,16,0,0,0,-0.3827,0,-0.9239,0,0,-1],
// 3 16 0 0 0 0 0 -1 0.3827 0 -0.9239
  [3,16,0,0,0,0,0,-1,0.3827,0,-0.9239],
// 3 16 0 0 0 0.3827 0 -0.9239 0.7071 0 -0.7071
  [3,16,0,0,0,0.3827,0,-0.9239,0.7071,0,-0.7071],
// 3 16 0 0 0 0.7071 0 -0.7071 0.9239 0 -0.3827
  [3,16,0,0,0,0.7071,0,-0.7071,0.9239,0,-0.3827],
// 3 16 0 0 0 0.9239 0 -0.3827 1 0 0
  [3,16,0,0,0,0.9239,0,-0.3827,1,0,0],
// 0
];
module ldraw_lib__4_4disc(step=0, col=false, unit=2/5, alt=false, line=0.2, solid=!$preview)
    makepoly(ldraw_lib__4_4disc(), step=step, col=col, unit=unit, alt=alt, line=line, solid=solid);
ldraw_lib__4_4disc(line=0.2);
// file: ../p/4-4cyli.scad
use <../lib.scad>
function ldraw_lib__4_4cyli() = [
// 0 Cylinder 1.0
// 0 Name: 4-4cyli.dat
// 0 Author: James Jessiman
// 0 !LDRAW_ORG Primitive UPDATE 2005-01
// 0 !LICENSE Licensed under CC BY 4.0 : see CAreadme.txt
// 
// 0 BFC CERTIFY CCW
  [0,"BFC","CERTIFY"],
  [0,"BFC","CCW"],
// 
// 0 !HISTORY 1998-12-15 [PTadmin] Official Update 1998-10
// 0 !HISTORY 2002-03-23 [sbliss] Added BFC statement; merged headers from files in distributions LDraw 0.27 and Complete.
// 0 !HISTORY 2002-04-25 [PTadmin] Official Update 2002-02
// 0 !HISTORY 2004-12-14 [guyvivan] BFC CCW
// 0 !HISTORY 2005-12-28 [PTadmin] Official Update 2005-01
// 0 !HISTORY 2007-06-24 [PTadmin] Header formatted for Contributor Agreement
// 0 !HISTORY 2008-07-01 [PTadmin] Official Update 2008-01
// 
// 
// 4 16 1 1 0 0.9239 1 0.3827 0.9239 0 0.3827 1 0 0
  [4,16,1,1,0,0.9239,1,0.3827,0.9239,0,0.3827,1,0,0],
// 5 24 1 0 0 1 1 0 0.9239 0 0.3827 0.9239 0 -0.3827
  [5,24,1,0,0,1,1,0,0.9239,0,0.3827,0.9239,0,-0.3827],
// 4 16 0.9239 1 0.3827 0.7071 1 0.7071 0.7071 0 0.7071 0.9239 0 0.3827
  [4,16,0.9239,1,0.3827,0.7071,1,0.7071,0.7071,0,0.7071,0.9239,0,0.3827],
// 5 24 0.9239 0 0.3827 0.9239 1 0.3827 0.7071 0 0.7071 1 0 0
  [5,24,0.9239,0,0.3827,0.9239,1,0.3827,0.7071,0,0.7071,1,0,0],
// 4 16 0.7071 1 0.7071 0.3827 1 0.9239 0.3827 0 0.9239 0.7071 0 0.7071
  [4,16,0.7071,1,0.7071,0.3827,1,0.9239,0.3827,0,0.9239,0.7071,0,0.7071],
// 5 24 0.7071 0 0.7071 0.7071 1 0.7071 0.3827 0 0.9239 0.9239 0 0.3827
  [5,24,0.7071,0,0.7071,0.7071,1,0.7071,0.3827,0,0.9239,0.9239,0,0.3827],
// 4 16 0.3827 1 0.9239 0 1 1 0 0 1 0.3827 0 0.9239
  [4,16,0.3827,1,0.9239,0,1,1,0,0,1,0.3827,0,0.9239],
// 5 24 0.3827 0 0.9239 0.3827 1 0.9239 0 0 1 0.7071 0 0.7071
  [5,24,0.3827,0,0.9239,0.3827,1,0.9239,0,0,1,0.7071,0,0.7071],
// 4 16 0 1 1 -0.3827 1 0.9239 -0.3827 0 0.9239 0 0 1
  [4,16,0,1,1,-0.3827,1,0.9239,-0.3827,0,0.9239,0,0,1],
// 5 24 0 0 1 0 1 1 -0.3827 0 0.9239 0.3827 0 0.9239
  [5,24,0,0,1,0,1,1,-0.3827,0,0.9239,0.3827,0,0.9239],
// 4 16 -0.3827 1 0.9239 -0.7071 1 0.7071 -0.7071 0 0.7071 -0.3827 0 0.9239
  [4,16,-0.3827,1,0.9239,-0.7071,1,0.7071,-0.7071,0,0.7071,-0.3827,0,0.9239],
// 5 24 -0.3827 0 0.9239 -0.3827 1 0.9239 -0.7071 0 0.7071 0 0 1
  [5,24,-0.3827,0,0.9239,-0.3827,1,0.9239,-0.7071,0,0.7071,0,0,1],
// 4 16 -0.7071 1 0.7071 -0.9239 1 0.3827 -0.9239 0 0.3827 -0.7071 0 0.7071
  [4,16,-0.7071,1,0.7071,-0.9239,1,0.3827,-0.9239,0,0.3827,-0.7071,0,0.7071],
// 5 24 -0.7071 0 0.7071 -0.7071 1 0.7071 -0.9239 0 0.3827 -0.3827 0 0.9239
  [5,24,-0.7071,0,0.7071,-0.7071,1,0.7071,-0.9239,0,0.3827,-0.3827,0,0.9239],
// 4 16 -0.9239 1 0.3827 -1 1 0 -1 0 0 -0.9239 0 0.3827
  [4,16,-0.9239,1,0.3827,-1,1,0,-1,0,0,-0.9239,0,0.3827],
// 5 24 -0.9239 0 0.3827 -0.9239 1 0.3827 -1 0 0 -0.7071 0 0.7071
  [5,24,-0.9239,0,0.3827,-0.9239,1,0.3827,-1,0,0,-0.7071,0,0.7071],
// 4 16 -1 1 0 -0.9239 1 -0.3827 -0.9239 0 -0.3827 -1 0 0
  [4,16,-1,1,0,-0.9239,1,-0.3827,-0.9239,0,-0.3827,-1,0,0],
// 5 24 -1 0 0 -1 1 0 -0.9239 0 -0.3827 -0.9239 0 0.3827
  [5,24,-1,0,0,-1,1,0,-0.9239,0,-0.3827,-0.9239,0,0.3827],
// 4 16 -0.9239 1 -0.3827 -0.7071 1 -0.7071 -0.7071 0 -0.7071 -0.9239 0 -0.3827
  [4,16,-0.9239,1,-0.3827,-0.7071,1,-0.7071,-0.7071,0,-0.7071,-0.9239,0,-0.3827],
// 5 24 -0.9239 0 -0.3827 -0.9239 1 -0.3827 -0.7071 0 -0.7071 -1 0 0
  [5,24,-0.9239,0,-0.3827,-0.9239,1,-0.3827,-0.7071,0,-0.7071,-1,0,0],
// 4 16 -0.7071 1 -0.7071 -0.3827 1 -0.9239 -0.3827 0 -0.9239 -0.7071 0 -0.7071
  [4,16,-0.7071,1,-0.7071,-0.3827,1,-0.9239,-0.3827,0,-0.9239,-0.7071,0,-0.7071],
// 5 24 -0.7071 0 -0.7071 -0.7071 1 -0.7071 -0.3827 0 -0.9239 -0.9239 0 -0.3827
  [5,24,-0.7071,0,-0.7071,-0.7071,1,-0.7071,-0.3827,0,-0.9239,-0.9239,0,-0.3827],
// 4 16 -0.3827 1 -0.9239 0 1 -1 0 0 -1 -0.3827 0 -0.9239
  [4,16,-0.3827,1,-0.9239,0,1,-1,0,0,-1,-0.3827,0,-0.9239],
// 5 24 -0.3827 0 -0.9239 -0.3827 1 -0.9239 0 0 -1 -0.7071 0 -0.7071
  [5,24,-0.3827,0,-0.9239,-0.3827,1,-0.9239,0,0,-1,-0.7071,0,-0.7071],
// 4 16 0 1 -1 0.3827 1 -0.9239 0.3827 0 -0.9239 0 0 -1
  [4,16,0,1,-1,0.3827,1,-0.9239,0.3827,0,-0.9239,0,0,-1],
// 5 24 0 0 -1 0 1 -1 0.3827 0 -0.9239 -0.3827 0 -0.9239
  [5,24,0,0,-1,0,1,-1,0.3827,0,-0.9239,-0.3827,0,-0.9239],
// 4 16 0.3827 1 -0.9239 0.7071 1 -0.7071 0.7071 0 -0.7071 0.3827 0 -0.9239
  [4,16,0.3827,1,-0.9239,0.7071,1,-0.7071,0.7071,0,-0.7071,0.3827,0,-0.9239],
// 5 24 0.3827 0 -0.9239 0.3827 1 -0.9239 0.7071 0 -0.7071 0 0 -1
  [5,24,0.3827,0,-0.9239,0.3827,1,-0.9239,0.7071,0,-0.7071,0,0,-1],
// 4 16 0.7071 1 -0.7071 0.9239 1 -0.3827 0.9239 0 -0.3827 0.7071 0 -0.7071
  [4,16,0.7071,1,-0.7071,0.9239,1,-0.3827,0.9239,0,-0.3827,0.7071,0,-0.7071],
// 5 24 0.7071 0 -0.7071 0.7071 1 -0.7071 0.9239 0 -0.3827 0.3827 0 -0.9239
  [5,24,0.7071,0,-0.7071,0.7071,1,-0.7071,0.9239,0,-0.3827,0.3827,0,-0.9239],
// 4 16 0.9239 1 -0.3827 1 1 0 1 0 0 0.9239 0 -0.3827
  [4,16,0.9239,1,-0.3827,1,1,0,1,0,0,0.9239,0,-0.3827],
// 5 24 0.9239 0 -0.3827 0.9239 1 -0.3827 1 0 0 0.7071 0 -0.7071
  [5,24,0.9239,0,-0.3827,0.9239,1,-0.3827,1,0,0,0.7071,0,-0.7071],
// 0
];
module ldraw_lib__4_4cyli(step=0, col=false, unit=2/5, alt=false, line=0.2, solid=!$preview)
    makepoly(ldraw_lib__4_4cyli(), step=step, col=col, unit=unit, alt=alt, line=line, solid=solid);
ldraw_lib__4_4cyli(line=0.2);
// file: ../p/4-4cylc.scad
use <../lib.scad>
use <4-4cyli.scad>
use <4-4disc.scad>
use <4-4edge.scad>
function ldraw_lib__4_4cylc() = [
// 0 Cylinder Closed 1.0
// 0 Name: 4-4cylc.dat
// 0 Author: Alex Taylor [anathema]
// 0 !LDRAW_ORG Primitive UPDATE 2009-02
// 0 !LICENSE Licensed under CC BY 4.0 : see CAreadme.txt
// 
// 0 BFC CERTIFY CCW
  [0,"BFC","CERTIFY"],
  [0,"BFC","CCW"],
// 
// 0 !HISTORY 2008-12-29 [cwdee] Removed one disc
// 0 !HISTORY 2009-09-03 [PTadmin] Official Update 2009-02
// 
// 
// 1 16 0 0 0 1 0 0 0 1 0 0 0 1 4-4edge.dat
  [1,16,0,0,0,1,0,0,0,1,0,0,0,1, ldraw_lib__4_4edge()],
// 1 16 0 1 0 1 0 0 0 1 0 0 0 1 4-4edge.dat
  [1,16,0,1,0,1,0,0,0,1,0,0,0,1, ldraw_lib__4_4edge()],
// 1 16 0 0 0 1 0 0 0 1 0 0 0 1 4-4disc.dat
  [1,16,0,0,0,1,0,0,0,1,0,0,0,1, ldraw_lib__4_4disc()],
// 1 16 0 0 0 1 0 0 0 1 0 0 0 1 4-4cyli.dat
  [1,16,0,0,0,1,0,0,0,1,0,0,0,1, ldraw_lib__4_4cyli()],
// 0
];
module ldraw_lib__4_4cylc(step=0, col=false, unit=2/5, alt=false, line=0.2, solid=!$preview)
    makepoly(ldraw_lib__4_4cylc(), step=step, col=col, unit=unit, alt=alt, line=line, solid=solid);
ldraw_lib__4_4cylc(line=0.2);
// main file
use <../lib.scad>
use <../p/4-4cylc.scad>
use <s/1756s01.scad>
function ldraw_lib__1756() = [
// 0 Minifig Carrot Nose
// 0 Name: 1756.dat
// 0 Author: Gerald Lasser [GeraldLasser]
// 0 !LDRAW_ORG Part UPDATE 2025-09
// 0 !LICENSE Licensed under CC BY 4.0 : see CAreadme.txt
// 
// 0 BFC CERTIFY CCW
  [0,"BFC","CERTIFY"],
  [0,"BFC","CCW"],
// 
// 0 !CATEGORY Minifig Headwear
// 0 !KEYWORDS Snowman
// 
// 0 !HISTORY 2024-10-21 {LEGO Instructions App} Original part shape
// 0 !HISTORY 2024-10-21 [GeraldLasser] File preparation for LDraw Parts Tracker
// 0 !HISTORY 2025-09-23 [Blechtaler] used prims
// 0 !HISTORY 2025-09-29 [OrionP] Official Update 2025-09
// 
// 1 16 0 0 0 4 0 0 0 -5 0 0 0 4 4-4cylc.dat
  [1,16,0,0,0,4,0,0,0,-5,0,0,0,4, ldraw_lib__4_4cylc()],
// 
// 1 16 0 0 0 1 0 0 0 1 0 0 0 1 s\1756s01.dat
  [1,16,0,0,0,1,0,0,0,1,0,0,0,1, ldraw_lib__s__1756s01()],
// 1 16 0 0 0 -1 0 0 0 1 0 0 0 1 s\1756s01.dat
  [1,16,0,0,0,-1,0,0,0,1,0,0,0,1, ldraw_lib__s__1756s01()],
];
module ldraw_lib__1756(step=0, col=false, unit=2/5, alt=false, line=0.2, solid=!$preview)
    makepoly(ldraw_lib__1756(), step=step, col=col, unit=unit, alt=alt, line=line, solid=solid);
ldraw_lib__1756(line=0.2);
